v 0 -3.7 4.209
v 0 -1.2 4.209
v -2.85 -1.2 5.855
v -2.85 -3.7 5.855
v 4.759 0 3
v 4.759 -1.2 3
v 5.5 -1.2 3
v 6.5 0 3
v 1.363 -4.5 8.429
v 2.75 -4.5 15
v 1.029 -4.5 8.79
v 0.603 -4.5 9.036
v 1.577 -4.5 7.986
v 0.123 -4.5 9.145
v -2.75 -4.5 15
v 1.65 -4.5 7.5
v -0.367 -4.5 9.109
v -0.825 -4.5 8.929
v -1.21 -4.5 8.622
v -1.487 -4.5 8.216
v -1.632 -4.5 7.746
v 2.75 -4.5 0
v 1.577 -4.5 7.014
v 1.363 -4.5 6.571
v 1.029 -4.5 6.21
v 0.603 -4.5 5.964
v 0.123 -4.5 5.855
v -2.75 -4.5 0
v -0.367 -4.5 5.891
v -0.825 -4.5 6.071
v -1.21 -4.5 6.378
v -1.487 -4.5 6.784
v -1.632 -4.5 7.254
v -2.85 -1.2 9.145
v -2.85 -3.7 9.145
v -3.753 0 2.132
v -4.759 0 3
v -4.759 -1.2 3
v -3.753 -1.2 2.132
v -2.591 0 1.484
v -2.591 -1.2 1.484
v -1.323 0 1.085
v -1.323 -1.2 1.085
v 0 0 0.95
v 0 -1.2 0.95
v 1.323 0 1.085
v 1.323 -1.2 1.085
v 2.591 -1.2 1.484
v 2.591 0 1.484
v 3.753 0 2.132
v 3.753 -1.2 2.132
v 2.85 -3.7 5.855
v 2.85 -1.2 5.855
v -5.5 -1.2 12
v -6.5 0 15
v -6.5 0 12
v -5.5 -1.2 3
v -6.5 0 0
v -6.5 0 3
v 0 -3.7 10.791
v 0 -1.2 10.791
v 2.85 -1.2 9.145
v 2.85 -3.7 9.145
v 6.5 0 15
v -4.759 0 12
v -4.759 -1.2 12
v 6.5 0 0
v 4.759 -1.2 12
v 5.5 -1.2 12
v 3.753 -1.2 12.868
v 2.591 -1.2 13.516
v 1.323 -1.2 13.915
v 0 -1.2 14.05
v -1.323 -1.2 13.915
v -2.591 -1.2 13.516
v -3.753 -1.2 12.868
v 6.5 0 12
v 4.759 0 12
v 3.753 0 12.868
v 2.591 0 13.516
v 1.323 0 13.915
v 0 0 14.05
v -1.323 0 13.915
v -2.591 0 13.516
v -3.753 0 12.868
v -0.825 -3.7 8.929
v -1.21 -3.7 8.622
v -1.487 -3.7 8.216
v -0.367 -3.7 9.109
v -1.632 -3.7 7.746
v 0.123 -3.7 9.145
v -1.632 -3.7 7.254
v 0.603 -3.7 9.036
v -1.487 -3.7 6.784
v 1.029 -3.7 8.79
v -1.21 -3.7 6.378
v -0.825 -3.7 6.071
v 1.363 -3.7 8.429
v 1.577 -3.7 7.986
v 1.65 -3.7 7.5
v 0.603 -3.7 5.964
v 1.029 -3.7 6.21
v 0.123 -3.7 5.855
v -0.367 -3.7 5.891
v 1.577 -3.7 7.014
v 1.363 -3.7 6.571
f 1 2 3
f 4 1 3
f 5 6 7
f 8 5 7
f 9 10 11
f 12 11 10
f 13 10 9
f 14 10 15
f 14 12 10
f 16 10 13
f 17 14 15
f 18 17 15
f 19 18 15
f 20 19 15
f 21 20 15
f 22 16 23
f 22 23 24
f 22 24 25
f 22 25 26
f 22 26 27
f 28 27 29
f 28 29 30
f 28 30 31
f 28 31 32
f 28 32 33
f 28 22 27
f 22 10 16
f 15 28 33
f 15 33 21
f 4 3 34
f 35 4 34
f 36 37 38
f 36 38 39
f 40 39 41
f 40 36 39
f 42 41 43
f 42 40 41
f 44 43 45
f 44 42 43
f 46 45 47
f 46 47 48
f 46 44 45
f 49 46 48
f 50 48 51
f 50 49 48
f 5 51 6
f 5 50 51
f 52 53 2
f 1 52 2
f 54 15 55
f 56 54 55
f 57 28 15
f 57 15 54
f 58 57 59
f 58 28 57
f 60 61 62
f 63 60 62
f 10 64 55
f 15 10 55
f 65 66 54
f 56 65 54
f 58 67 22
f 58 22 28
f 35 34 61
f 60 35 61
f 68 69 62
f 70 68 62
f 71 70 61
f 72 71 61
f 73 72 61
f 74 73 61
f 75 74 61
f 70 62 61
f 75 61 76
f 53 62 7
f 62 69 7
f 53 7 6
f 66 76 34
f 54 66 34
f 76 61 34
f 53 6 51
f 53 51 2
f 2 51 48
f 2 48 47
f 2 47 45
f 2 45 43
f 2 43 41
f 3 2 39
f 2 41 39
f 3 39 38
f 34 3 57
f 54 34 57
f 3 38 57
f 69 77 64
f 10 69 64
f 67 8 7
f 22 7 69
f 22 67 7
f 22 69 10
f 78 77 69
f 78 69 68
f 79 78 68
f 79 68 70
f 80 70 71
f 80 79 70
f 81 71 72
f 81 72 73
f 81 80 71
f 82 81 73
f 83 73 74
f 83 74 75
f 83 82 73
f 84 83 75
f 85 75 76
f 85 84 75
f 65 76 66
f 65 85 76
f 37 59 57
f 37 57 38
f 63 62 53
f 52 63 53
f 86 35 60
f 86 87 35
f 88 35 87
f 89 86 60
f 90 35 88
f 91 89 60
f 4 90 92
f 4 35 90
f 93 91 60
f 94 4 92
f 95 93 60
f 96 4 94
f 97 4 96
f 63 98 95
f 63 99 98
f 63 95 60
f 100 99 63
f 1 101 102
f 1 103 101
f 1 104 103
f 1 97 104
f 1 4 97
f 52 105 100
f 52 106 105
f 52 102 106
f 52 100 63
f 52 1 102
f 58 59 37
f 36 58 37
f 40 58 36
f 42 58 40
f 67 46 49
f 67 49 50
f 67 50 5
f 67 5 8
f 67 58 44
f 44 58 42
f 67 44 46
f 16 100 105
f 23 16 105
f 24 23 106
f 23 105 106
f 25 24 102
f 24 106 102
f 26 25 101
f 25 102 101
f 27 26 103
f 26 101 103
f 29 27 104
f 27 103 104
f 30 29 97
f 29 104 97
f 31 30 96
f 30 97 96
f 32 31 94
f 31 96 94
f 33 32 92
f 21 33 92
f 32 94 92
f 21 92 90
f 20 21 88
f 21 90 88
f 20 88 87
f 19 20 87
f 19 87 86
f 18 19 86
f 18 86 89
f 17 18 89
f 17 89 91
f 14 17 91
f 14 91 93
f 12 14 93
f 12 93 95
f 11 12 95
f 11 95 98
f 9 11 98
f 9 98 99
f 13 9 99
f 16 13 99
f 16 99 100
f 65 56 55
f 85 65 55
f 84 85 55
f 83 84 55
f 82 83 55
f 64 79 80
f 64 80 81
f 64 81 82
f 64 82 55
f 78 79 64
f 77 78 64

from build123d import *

# Parameters (mm, degrees)
RESSALTO_EXTRUS_O1_DEPTH = 15
ESBO_O2_R                = 1.65
CORTE_EXTRUS_O1_DEPTH    = 15
CORTE_EXTRUS_O5_DEPTH    = 1.2
CORTE_EXTRUS_O6_DEPTH    = 2.5


with BuildPart() as part:
    # Esboço1 → Ressalto-extrusão1 (new body)
    with BuildSketch(Plane.XY):
        Polygon((-6.5, 0), (6.5, 0), (2.75, -4.5), (-2.75, -4.5), align=None)
    extrude(amount=RESSALTO_EXTRUS_O1_DEPTH)

    # Esboço2 → Corte-extrusão1 (cut)
    with BuildSketch(Plane(origin=(0, 0, 0), x_dir=(1, 0, 0), z_dir=(0, 1, 0))):
        with Locations((0, -7.5)):
            Circle(ESBO_O2_R)
    extrude(amount=-CORTE_EXTRUS_O1_DEPTH, mode=Mode.SUBTRACT)

    # Esboço3 → Corte-extrusão5 (cut)
    with BuildSketch(Plane(origin=(0, 0, 0), x_dir=(1, 0, 0), z_dir=(0, 1, 0))):
        with BuildLine():
            Line((4.759464256, -3), (7.813565265, -3))
            Line((7.813565265, -3), (7.813565265, -12))
            Line((7.813565265, -12), (4.759464256, -12))
            ThreePointArc((4.759464256, -12), (0, -14.05), (-4.759464256, -12))
            Line((-4.759464256, -12), (-7.813565265, -12))
            Line((-7.813565265, -12), (-7.813565265, -3))
            Line((-7.813565265, -3), (-4.759464256, -3))
            ThreePointArc((-4.759464256, -3), (0, -0.95), (4.759464256, -3))
        make_face()
    extrude(amount=-CORTE_EXTRUS_O5_DEPTH, mode=Mode.SUBTRACT)

    # Esboço4 → Corte-extrusão6 (cut)
    with BuildSketch(Plane(origin=(0, -1.2, 0), x_dir=(1, 0, 0), z_dir=(0, 1, 0))):
        Polygon((0, -4.209103466), (-2.85, -5.854551733), (-2.85, -9.145448267), (0, -10.790896534), (2.85, -9.145448267), (2.85, -5.854551733), align=None)
    extrude(amount=-CORTE_EXTRUS_O6_DEPTH, mode=Mode.SUBTRACT)


solid = part.part
